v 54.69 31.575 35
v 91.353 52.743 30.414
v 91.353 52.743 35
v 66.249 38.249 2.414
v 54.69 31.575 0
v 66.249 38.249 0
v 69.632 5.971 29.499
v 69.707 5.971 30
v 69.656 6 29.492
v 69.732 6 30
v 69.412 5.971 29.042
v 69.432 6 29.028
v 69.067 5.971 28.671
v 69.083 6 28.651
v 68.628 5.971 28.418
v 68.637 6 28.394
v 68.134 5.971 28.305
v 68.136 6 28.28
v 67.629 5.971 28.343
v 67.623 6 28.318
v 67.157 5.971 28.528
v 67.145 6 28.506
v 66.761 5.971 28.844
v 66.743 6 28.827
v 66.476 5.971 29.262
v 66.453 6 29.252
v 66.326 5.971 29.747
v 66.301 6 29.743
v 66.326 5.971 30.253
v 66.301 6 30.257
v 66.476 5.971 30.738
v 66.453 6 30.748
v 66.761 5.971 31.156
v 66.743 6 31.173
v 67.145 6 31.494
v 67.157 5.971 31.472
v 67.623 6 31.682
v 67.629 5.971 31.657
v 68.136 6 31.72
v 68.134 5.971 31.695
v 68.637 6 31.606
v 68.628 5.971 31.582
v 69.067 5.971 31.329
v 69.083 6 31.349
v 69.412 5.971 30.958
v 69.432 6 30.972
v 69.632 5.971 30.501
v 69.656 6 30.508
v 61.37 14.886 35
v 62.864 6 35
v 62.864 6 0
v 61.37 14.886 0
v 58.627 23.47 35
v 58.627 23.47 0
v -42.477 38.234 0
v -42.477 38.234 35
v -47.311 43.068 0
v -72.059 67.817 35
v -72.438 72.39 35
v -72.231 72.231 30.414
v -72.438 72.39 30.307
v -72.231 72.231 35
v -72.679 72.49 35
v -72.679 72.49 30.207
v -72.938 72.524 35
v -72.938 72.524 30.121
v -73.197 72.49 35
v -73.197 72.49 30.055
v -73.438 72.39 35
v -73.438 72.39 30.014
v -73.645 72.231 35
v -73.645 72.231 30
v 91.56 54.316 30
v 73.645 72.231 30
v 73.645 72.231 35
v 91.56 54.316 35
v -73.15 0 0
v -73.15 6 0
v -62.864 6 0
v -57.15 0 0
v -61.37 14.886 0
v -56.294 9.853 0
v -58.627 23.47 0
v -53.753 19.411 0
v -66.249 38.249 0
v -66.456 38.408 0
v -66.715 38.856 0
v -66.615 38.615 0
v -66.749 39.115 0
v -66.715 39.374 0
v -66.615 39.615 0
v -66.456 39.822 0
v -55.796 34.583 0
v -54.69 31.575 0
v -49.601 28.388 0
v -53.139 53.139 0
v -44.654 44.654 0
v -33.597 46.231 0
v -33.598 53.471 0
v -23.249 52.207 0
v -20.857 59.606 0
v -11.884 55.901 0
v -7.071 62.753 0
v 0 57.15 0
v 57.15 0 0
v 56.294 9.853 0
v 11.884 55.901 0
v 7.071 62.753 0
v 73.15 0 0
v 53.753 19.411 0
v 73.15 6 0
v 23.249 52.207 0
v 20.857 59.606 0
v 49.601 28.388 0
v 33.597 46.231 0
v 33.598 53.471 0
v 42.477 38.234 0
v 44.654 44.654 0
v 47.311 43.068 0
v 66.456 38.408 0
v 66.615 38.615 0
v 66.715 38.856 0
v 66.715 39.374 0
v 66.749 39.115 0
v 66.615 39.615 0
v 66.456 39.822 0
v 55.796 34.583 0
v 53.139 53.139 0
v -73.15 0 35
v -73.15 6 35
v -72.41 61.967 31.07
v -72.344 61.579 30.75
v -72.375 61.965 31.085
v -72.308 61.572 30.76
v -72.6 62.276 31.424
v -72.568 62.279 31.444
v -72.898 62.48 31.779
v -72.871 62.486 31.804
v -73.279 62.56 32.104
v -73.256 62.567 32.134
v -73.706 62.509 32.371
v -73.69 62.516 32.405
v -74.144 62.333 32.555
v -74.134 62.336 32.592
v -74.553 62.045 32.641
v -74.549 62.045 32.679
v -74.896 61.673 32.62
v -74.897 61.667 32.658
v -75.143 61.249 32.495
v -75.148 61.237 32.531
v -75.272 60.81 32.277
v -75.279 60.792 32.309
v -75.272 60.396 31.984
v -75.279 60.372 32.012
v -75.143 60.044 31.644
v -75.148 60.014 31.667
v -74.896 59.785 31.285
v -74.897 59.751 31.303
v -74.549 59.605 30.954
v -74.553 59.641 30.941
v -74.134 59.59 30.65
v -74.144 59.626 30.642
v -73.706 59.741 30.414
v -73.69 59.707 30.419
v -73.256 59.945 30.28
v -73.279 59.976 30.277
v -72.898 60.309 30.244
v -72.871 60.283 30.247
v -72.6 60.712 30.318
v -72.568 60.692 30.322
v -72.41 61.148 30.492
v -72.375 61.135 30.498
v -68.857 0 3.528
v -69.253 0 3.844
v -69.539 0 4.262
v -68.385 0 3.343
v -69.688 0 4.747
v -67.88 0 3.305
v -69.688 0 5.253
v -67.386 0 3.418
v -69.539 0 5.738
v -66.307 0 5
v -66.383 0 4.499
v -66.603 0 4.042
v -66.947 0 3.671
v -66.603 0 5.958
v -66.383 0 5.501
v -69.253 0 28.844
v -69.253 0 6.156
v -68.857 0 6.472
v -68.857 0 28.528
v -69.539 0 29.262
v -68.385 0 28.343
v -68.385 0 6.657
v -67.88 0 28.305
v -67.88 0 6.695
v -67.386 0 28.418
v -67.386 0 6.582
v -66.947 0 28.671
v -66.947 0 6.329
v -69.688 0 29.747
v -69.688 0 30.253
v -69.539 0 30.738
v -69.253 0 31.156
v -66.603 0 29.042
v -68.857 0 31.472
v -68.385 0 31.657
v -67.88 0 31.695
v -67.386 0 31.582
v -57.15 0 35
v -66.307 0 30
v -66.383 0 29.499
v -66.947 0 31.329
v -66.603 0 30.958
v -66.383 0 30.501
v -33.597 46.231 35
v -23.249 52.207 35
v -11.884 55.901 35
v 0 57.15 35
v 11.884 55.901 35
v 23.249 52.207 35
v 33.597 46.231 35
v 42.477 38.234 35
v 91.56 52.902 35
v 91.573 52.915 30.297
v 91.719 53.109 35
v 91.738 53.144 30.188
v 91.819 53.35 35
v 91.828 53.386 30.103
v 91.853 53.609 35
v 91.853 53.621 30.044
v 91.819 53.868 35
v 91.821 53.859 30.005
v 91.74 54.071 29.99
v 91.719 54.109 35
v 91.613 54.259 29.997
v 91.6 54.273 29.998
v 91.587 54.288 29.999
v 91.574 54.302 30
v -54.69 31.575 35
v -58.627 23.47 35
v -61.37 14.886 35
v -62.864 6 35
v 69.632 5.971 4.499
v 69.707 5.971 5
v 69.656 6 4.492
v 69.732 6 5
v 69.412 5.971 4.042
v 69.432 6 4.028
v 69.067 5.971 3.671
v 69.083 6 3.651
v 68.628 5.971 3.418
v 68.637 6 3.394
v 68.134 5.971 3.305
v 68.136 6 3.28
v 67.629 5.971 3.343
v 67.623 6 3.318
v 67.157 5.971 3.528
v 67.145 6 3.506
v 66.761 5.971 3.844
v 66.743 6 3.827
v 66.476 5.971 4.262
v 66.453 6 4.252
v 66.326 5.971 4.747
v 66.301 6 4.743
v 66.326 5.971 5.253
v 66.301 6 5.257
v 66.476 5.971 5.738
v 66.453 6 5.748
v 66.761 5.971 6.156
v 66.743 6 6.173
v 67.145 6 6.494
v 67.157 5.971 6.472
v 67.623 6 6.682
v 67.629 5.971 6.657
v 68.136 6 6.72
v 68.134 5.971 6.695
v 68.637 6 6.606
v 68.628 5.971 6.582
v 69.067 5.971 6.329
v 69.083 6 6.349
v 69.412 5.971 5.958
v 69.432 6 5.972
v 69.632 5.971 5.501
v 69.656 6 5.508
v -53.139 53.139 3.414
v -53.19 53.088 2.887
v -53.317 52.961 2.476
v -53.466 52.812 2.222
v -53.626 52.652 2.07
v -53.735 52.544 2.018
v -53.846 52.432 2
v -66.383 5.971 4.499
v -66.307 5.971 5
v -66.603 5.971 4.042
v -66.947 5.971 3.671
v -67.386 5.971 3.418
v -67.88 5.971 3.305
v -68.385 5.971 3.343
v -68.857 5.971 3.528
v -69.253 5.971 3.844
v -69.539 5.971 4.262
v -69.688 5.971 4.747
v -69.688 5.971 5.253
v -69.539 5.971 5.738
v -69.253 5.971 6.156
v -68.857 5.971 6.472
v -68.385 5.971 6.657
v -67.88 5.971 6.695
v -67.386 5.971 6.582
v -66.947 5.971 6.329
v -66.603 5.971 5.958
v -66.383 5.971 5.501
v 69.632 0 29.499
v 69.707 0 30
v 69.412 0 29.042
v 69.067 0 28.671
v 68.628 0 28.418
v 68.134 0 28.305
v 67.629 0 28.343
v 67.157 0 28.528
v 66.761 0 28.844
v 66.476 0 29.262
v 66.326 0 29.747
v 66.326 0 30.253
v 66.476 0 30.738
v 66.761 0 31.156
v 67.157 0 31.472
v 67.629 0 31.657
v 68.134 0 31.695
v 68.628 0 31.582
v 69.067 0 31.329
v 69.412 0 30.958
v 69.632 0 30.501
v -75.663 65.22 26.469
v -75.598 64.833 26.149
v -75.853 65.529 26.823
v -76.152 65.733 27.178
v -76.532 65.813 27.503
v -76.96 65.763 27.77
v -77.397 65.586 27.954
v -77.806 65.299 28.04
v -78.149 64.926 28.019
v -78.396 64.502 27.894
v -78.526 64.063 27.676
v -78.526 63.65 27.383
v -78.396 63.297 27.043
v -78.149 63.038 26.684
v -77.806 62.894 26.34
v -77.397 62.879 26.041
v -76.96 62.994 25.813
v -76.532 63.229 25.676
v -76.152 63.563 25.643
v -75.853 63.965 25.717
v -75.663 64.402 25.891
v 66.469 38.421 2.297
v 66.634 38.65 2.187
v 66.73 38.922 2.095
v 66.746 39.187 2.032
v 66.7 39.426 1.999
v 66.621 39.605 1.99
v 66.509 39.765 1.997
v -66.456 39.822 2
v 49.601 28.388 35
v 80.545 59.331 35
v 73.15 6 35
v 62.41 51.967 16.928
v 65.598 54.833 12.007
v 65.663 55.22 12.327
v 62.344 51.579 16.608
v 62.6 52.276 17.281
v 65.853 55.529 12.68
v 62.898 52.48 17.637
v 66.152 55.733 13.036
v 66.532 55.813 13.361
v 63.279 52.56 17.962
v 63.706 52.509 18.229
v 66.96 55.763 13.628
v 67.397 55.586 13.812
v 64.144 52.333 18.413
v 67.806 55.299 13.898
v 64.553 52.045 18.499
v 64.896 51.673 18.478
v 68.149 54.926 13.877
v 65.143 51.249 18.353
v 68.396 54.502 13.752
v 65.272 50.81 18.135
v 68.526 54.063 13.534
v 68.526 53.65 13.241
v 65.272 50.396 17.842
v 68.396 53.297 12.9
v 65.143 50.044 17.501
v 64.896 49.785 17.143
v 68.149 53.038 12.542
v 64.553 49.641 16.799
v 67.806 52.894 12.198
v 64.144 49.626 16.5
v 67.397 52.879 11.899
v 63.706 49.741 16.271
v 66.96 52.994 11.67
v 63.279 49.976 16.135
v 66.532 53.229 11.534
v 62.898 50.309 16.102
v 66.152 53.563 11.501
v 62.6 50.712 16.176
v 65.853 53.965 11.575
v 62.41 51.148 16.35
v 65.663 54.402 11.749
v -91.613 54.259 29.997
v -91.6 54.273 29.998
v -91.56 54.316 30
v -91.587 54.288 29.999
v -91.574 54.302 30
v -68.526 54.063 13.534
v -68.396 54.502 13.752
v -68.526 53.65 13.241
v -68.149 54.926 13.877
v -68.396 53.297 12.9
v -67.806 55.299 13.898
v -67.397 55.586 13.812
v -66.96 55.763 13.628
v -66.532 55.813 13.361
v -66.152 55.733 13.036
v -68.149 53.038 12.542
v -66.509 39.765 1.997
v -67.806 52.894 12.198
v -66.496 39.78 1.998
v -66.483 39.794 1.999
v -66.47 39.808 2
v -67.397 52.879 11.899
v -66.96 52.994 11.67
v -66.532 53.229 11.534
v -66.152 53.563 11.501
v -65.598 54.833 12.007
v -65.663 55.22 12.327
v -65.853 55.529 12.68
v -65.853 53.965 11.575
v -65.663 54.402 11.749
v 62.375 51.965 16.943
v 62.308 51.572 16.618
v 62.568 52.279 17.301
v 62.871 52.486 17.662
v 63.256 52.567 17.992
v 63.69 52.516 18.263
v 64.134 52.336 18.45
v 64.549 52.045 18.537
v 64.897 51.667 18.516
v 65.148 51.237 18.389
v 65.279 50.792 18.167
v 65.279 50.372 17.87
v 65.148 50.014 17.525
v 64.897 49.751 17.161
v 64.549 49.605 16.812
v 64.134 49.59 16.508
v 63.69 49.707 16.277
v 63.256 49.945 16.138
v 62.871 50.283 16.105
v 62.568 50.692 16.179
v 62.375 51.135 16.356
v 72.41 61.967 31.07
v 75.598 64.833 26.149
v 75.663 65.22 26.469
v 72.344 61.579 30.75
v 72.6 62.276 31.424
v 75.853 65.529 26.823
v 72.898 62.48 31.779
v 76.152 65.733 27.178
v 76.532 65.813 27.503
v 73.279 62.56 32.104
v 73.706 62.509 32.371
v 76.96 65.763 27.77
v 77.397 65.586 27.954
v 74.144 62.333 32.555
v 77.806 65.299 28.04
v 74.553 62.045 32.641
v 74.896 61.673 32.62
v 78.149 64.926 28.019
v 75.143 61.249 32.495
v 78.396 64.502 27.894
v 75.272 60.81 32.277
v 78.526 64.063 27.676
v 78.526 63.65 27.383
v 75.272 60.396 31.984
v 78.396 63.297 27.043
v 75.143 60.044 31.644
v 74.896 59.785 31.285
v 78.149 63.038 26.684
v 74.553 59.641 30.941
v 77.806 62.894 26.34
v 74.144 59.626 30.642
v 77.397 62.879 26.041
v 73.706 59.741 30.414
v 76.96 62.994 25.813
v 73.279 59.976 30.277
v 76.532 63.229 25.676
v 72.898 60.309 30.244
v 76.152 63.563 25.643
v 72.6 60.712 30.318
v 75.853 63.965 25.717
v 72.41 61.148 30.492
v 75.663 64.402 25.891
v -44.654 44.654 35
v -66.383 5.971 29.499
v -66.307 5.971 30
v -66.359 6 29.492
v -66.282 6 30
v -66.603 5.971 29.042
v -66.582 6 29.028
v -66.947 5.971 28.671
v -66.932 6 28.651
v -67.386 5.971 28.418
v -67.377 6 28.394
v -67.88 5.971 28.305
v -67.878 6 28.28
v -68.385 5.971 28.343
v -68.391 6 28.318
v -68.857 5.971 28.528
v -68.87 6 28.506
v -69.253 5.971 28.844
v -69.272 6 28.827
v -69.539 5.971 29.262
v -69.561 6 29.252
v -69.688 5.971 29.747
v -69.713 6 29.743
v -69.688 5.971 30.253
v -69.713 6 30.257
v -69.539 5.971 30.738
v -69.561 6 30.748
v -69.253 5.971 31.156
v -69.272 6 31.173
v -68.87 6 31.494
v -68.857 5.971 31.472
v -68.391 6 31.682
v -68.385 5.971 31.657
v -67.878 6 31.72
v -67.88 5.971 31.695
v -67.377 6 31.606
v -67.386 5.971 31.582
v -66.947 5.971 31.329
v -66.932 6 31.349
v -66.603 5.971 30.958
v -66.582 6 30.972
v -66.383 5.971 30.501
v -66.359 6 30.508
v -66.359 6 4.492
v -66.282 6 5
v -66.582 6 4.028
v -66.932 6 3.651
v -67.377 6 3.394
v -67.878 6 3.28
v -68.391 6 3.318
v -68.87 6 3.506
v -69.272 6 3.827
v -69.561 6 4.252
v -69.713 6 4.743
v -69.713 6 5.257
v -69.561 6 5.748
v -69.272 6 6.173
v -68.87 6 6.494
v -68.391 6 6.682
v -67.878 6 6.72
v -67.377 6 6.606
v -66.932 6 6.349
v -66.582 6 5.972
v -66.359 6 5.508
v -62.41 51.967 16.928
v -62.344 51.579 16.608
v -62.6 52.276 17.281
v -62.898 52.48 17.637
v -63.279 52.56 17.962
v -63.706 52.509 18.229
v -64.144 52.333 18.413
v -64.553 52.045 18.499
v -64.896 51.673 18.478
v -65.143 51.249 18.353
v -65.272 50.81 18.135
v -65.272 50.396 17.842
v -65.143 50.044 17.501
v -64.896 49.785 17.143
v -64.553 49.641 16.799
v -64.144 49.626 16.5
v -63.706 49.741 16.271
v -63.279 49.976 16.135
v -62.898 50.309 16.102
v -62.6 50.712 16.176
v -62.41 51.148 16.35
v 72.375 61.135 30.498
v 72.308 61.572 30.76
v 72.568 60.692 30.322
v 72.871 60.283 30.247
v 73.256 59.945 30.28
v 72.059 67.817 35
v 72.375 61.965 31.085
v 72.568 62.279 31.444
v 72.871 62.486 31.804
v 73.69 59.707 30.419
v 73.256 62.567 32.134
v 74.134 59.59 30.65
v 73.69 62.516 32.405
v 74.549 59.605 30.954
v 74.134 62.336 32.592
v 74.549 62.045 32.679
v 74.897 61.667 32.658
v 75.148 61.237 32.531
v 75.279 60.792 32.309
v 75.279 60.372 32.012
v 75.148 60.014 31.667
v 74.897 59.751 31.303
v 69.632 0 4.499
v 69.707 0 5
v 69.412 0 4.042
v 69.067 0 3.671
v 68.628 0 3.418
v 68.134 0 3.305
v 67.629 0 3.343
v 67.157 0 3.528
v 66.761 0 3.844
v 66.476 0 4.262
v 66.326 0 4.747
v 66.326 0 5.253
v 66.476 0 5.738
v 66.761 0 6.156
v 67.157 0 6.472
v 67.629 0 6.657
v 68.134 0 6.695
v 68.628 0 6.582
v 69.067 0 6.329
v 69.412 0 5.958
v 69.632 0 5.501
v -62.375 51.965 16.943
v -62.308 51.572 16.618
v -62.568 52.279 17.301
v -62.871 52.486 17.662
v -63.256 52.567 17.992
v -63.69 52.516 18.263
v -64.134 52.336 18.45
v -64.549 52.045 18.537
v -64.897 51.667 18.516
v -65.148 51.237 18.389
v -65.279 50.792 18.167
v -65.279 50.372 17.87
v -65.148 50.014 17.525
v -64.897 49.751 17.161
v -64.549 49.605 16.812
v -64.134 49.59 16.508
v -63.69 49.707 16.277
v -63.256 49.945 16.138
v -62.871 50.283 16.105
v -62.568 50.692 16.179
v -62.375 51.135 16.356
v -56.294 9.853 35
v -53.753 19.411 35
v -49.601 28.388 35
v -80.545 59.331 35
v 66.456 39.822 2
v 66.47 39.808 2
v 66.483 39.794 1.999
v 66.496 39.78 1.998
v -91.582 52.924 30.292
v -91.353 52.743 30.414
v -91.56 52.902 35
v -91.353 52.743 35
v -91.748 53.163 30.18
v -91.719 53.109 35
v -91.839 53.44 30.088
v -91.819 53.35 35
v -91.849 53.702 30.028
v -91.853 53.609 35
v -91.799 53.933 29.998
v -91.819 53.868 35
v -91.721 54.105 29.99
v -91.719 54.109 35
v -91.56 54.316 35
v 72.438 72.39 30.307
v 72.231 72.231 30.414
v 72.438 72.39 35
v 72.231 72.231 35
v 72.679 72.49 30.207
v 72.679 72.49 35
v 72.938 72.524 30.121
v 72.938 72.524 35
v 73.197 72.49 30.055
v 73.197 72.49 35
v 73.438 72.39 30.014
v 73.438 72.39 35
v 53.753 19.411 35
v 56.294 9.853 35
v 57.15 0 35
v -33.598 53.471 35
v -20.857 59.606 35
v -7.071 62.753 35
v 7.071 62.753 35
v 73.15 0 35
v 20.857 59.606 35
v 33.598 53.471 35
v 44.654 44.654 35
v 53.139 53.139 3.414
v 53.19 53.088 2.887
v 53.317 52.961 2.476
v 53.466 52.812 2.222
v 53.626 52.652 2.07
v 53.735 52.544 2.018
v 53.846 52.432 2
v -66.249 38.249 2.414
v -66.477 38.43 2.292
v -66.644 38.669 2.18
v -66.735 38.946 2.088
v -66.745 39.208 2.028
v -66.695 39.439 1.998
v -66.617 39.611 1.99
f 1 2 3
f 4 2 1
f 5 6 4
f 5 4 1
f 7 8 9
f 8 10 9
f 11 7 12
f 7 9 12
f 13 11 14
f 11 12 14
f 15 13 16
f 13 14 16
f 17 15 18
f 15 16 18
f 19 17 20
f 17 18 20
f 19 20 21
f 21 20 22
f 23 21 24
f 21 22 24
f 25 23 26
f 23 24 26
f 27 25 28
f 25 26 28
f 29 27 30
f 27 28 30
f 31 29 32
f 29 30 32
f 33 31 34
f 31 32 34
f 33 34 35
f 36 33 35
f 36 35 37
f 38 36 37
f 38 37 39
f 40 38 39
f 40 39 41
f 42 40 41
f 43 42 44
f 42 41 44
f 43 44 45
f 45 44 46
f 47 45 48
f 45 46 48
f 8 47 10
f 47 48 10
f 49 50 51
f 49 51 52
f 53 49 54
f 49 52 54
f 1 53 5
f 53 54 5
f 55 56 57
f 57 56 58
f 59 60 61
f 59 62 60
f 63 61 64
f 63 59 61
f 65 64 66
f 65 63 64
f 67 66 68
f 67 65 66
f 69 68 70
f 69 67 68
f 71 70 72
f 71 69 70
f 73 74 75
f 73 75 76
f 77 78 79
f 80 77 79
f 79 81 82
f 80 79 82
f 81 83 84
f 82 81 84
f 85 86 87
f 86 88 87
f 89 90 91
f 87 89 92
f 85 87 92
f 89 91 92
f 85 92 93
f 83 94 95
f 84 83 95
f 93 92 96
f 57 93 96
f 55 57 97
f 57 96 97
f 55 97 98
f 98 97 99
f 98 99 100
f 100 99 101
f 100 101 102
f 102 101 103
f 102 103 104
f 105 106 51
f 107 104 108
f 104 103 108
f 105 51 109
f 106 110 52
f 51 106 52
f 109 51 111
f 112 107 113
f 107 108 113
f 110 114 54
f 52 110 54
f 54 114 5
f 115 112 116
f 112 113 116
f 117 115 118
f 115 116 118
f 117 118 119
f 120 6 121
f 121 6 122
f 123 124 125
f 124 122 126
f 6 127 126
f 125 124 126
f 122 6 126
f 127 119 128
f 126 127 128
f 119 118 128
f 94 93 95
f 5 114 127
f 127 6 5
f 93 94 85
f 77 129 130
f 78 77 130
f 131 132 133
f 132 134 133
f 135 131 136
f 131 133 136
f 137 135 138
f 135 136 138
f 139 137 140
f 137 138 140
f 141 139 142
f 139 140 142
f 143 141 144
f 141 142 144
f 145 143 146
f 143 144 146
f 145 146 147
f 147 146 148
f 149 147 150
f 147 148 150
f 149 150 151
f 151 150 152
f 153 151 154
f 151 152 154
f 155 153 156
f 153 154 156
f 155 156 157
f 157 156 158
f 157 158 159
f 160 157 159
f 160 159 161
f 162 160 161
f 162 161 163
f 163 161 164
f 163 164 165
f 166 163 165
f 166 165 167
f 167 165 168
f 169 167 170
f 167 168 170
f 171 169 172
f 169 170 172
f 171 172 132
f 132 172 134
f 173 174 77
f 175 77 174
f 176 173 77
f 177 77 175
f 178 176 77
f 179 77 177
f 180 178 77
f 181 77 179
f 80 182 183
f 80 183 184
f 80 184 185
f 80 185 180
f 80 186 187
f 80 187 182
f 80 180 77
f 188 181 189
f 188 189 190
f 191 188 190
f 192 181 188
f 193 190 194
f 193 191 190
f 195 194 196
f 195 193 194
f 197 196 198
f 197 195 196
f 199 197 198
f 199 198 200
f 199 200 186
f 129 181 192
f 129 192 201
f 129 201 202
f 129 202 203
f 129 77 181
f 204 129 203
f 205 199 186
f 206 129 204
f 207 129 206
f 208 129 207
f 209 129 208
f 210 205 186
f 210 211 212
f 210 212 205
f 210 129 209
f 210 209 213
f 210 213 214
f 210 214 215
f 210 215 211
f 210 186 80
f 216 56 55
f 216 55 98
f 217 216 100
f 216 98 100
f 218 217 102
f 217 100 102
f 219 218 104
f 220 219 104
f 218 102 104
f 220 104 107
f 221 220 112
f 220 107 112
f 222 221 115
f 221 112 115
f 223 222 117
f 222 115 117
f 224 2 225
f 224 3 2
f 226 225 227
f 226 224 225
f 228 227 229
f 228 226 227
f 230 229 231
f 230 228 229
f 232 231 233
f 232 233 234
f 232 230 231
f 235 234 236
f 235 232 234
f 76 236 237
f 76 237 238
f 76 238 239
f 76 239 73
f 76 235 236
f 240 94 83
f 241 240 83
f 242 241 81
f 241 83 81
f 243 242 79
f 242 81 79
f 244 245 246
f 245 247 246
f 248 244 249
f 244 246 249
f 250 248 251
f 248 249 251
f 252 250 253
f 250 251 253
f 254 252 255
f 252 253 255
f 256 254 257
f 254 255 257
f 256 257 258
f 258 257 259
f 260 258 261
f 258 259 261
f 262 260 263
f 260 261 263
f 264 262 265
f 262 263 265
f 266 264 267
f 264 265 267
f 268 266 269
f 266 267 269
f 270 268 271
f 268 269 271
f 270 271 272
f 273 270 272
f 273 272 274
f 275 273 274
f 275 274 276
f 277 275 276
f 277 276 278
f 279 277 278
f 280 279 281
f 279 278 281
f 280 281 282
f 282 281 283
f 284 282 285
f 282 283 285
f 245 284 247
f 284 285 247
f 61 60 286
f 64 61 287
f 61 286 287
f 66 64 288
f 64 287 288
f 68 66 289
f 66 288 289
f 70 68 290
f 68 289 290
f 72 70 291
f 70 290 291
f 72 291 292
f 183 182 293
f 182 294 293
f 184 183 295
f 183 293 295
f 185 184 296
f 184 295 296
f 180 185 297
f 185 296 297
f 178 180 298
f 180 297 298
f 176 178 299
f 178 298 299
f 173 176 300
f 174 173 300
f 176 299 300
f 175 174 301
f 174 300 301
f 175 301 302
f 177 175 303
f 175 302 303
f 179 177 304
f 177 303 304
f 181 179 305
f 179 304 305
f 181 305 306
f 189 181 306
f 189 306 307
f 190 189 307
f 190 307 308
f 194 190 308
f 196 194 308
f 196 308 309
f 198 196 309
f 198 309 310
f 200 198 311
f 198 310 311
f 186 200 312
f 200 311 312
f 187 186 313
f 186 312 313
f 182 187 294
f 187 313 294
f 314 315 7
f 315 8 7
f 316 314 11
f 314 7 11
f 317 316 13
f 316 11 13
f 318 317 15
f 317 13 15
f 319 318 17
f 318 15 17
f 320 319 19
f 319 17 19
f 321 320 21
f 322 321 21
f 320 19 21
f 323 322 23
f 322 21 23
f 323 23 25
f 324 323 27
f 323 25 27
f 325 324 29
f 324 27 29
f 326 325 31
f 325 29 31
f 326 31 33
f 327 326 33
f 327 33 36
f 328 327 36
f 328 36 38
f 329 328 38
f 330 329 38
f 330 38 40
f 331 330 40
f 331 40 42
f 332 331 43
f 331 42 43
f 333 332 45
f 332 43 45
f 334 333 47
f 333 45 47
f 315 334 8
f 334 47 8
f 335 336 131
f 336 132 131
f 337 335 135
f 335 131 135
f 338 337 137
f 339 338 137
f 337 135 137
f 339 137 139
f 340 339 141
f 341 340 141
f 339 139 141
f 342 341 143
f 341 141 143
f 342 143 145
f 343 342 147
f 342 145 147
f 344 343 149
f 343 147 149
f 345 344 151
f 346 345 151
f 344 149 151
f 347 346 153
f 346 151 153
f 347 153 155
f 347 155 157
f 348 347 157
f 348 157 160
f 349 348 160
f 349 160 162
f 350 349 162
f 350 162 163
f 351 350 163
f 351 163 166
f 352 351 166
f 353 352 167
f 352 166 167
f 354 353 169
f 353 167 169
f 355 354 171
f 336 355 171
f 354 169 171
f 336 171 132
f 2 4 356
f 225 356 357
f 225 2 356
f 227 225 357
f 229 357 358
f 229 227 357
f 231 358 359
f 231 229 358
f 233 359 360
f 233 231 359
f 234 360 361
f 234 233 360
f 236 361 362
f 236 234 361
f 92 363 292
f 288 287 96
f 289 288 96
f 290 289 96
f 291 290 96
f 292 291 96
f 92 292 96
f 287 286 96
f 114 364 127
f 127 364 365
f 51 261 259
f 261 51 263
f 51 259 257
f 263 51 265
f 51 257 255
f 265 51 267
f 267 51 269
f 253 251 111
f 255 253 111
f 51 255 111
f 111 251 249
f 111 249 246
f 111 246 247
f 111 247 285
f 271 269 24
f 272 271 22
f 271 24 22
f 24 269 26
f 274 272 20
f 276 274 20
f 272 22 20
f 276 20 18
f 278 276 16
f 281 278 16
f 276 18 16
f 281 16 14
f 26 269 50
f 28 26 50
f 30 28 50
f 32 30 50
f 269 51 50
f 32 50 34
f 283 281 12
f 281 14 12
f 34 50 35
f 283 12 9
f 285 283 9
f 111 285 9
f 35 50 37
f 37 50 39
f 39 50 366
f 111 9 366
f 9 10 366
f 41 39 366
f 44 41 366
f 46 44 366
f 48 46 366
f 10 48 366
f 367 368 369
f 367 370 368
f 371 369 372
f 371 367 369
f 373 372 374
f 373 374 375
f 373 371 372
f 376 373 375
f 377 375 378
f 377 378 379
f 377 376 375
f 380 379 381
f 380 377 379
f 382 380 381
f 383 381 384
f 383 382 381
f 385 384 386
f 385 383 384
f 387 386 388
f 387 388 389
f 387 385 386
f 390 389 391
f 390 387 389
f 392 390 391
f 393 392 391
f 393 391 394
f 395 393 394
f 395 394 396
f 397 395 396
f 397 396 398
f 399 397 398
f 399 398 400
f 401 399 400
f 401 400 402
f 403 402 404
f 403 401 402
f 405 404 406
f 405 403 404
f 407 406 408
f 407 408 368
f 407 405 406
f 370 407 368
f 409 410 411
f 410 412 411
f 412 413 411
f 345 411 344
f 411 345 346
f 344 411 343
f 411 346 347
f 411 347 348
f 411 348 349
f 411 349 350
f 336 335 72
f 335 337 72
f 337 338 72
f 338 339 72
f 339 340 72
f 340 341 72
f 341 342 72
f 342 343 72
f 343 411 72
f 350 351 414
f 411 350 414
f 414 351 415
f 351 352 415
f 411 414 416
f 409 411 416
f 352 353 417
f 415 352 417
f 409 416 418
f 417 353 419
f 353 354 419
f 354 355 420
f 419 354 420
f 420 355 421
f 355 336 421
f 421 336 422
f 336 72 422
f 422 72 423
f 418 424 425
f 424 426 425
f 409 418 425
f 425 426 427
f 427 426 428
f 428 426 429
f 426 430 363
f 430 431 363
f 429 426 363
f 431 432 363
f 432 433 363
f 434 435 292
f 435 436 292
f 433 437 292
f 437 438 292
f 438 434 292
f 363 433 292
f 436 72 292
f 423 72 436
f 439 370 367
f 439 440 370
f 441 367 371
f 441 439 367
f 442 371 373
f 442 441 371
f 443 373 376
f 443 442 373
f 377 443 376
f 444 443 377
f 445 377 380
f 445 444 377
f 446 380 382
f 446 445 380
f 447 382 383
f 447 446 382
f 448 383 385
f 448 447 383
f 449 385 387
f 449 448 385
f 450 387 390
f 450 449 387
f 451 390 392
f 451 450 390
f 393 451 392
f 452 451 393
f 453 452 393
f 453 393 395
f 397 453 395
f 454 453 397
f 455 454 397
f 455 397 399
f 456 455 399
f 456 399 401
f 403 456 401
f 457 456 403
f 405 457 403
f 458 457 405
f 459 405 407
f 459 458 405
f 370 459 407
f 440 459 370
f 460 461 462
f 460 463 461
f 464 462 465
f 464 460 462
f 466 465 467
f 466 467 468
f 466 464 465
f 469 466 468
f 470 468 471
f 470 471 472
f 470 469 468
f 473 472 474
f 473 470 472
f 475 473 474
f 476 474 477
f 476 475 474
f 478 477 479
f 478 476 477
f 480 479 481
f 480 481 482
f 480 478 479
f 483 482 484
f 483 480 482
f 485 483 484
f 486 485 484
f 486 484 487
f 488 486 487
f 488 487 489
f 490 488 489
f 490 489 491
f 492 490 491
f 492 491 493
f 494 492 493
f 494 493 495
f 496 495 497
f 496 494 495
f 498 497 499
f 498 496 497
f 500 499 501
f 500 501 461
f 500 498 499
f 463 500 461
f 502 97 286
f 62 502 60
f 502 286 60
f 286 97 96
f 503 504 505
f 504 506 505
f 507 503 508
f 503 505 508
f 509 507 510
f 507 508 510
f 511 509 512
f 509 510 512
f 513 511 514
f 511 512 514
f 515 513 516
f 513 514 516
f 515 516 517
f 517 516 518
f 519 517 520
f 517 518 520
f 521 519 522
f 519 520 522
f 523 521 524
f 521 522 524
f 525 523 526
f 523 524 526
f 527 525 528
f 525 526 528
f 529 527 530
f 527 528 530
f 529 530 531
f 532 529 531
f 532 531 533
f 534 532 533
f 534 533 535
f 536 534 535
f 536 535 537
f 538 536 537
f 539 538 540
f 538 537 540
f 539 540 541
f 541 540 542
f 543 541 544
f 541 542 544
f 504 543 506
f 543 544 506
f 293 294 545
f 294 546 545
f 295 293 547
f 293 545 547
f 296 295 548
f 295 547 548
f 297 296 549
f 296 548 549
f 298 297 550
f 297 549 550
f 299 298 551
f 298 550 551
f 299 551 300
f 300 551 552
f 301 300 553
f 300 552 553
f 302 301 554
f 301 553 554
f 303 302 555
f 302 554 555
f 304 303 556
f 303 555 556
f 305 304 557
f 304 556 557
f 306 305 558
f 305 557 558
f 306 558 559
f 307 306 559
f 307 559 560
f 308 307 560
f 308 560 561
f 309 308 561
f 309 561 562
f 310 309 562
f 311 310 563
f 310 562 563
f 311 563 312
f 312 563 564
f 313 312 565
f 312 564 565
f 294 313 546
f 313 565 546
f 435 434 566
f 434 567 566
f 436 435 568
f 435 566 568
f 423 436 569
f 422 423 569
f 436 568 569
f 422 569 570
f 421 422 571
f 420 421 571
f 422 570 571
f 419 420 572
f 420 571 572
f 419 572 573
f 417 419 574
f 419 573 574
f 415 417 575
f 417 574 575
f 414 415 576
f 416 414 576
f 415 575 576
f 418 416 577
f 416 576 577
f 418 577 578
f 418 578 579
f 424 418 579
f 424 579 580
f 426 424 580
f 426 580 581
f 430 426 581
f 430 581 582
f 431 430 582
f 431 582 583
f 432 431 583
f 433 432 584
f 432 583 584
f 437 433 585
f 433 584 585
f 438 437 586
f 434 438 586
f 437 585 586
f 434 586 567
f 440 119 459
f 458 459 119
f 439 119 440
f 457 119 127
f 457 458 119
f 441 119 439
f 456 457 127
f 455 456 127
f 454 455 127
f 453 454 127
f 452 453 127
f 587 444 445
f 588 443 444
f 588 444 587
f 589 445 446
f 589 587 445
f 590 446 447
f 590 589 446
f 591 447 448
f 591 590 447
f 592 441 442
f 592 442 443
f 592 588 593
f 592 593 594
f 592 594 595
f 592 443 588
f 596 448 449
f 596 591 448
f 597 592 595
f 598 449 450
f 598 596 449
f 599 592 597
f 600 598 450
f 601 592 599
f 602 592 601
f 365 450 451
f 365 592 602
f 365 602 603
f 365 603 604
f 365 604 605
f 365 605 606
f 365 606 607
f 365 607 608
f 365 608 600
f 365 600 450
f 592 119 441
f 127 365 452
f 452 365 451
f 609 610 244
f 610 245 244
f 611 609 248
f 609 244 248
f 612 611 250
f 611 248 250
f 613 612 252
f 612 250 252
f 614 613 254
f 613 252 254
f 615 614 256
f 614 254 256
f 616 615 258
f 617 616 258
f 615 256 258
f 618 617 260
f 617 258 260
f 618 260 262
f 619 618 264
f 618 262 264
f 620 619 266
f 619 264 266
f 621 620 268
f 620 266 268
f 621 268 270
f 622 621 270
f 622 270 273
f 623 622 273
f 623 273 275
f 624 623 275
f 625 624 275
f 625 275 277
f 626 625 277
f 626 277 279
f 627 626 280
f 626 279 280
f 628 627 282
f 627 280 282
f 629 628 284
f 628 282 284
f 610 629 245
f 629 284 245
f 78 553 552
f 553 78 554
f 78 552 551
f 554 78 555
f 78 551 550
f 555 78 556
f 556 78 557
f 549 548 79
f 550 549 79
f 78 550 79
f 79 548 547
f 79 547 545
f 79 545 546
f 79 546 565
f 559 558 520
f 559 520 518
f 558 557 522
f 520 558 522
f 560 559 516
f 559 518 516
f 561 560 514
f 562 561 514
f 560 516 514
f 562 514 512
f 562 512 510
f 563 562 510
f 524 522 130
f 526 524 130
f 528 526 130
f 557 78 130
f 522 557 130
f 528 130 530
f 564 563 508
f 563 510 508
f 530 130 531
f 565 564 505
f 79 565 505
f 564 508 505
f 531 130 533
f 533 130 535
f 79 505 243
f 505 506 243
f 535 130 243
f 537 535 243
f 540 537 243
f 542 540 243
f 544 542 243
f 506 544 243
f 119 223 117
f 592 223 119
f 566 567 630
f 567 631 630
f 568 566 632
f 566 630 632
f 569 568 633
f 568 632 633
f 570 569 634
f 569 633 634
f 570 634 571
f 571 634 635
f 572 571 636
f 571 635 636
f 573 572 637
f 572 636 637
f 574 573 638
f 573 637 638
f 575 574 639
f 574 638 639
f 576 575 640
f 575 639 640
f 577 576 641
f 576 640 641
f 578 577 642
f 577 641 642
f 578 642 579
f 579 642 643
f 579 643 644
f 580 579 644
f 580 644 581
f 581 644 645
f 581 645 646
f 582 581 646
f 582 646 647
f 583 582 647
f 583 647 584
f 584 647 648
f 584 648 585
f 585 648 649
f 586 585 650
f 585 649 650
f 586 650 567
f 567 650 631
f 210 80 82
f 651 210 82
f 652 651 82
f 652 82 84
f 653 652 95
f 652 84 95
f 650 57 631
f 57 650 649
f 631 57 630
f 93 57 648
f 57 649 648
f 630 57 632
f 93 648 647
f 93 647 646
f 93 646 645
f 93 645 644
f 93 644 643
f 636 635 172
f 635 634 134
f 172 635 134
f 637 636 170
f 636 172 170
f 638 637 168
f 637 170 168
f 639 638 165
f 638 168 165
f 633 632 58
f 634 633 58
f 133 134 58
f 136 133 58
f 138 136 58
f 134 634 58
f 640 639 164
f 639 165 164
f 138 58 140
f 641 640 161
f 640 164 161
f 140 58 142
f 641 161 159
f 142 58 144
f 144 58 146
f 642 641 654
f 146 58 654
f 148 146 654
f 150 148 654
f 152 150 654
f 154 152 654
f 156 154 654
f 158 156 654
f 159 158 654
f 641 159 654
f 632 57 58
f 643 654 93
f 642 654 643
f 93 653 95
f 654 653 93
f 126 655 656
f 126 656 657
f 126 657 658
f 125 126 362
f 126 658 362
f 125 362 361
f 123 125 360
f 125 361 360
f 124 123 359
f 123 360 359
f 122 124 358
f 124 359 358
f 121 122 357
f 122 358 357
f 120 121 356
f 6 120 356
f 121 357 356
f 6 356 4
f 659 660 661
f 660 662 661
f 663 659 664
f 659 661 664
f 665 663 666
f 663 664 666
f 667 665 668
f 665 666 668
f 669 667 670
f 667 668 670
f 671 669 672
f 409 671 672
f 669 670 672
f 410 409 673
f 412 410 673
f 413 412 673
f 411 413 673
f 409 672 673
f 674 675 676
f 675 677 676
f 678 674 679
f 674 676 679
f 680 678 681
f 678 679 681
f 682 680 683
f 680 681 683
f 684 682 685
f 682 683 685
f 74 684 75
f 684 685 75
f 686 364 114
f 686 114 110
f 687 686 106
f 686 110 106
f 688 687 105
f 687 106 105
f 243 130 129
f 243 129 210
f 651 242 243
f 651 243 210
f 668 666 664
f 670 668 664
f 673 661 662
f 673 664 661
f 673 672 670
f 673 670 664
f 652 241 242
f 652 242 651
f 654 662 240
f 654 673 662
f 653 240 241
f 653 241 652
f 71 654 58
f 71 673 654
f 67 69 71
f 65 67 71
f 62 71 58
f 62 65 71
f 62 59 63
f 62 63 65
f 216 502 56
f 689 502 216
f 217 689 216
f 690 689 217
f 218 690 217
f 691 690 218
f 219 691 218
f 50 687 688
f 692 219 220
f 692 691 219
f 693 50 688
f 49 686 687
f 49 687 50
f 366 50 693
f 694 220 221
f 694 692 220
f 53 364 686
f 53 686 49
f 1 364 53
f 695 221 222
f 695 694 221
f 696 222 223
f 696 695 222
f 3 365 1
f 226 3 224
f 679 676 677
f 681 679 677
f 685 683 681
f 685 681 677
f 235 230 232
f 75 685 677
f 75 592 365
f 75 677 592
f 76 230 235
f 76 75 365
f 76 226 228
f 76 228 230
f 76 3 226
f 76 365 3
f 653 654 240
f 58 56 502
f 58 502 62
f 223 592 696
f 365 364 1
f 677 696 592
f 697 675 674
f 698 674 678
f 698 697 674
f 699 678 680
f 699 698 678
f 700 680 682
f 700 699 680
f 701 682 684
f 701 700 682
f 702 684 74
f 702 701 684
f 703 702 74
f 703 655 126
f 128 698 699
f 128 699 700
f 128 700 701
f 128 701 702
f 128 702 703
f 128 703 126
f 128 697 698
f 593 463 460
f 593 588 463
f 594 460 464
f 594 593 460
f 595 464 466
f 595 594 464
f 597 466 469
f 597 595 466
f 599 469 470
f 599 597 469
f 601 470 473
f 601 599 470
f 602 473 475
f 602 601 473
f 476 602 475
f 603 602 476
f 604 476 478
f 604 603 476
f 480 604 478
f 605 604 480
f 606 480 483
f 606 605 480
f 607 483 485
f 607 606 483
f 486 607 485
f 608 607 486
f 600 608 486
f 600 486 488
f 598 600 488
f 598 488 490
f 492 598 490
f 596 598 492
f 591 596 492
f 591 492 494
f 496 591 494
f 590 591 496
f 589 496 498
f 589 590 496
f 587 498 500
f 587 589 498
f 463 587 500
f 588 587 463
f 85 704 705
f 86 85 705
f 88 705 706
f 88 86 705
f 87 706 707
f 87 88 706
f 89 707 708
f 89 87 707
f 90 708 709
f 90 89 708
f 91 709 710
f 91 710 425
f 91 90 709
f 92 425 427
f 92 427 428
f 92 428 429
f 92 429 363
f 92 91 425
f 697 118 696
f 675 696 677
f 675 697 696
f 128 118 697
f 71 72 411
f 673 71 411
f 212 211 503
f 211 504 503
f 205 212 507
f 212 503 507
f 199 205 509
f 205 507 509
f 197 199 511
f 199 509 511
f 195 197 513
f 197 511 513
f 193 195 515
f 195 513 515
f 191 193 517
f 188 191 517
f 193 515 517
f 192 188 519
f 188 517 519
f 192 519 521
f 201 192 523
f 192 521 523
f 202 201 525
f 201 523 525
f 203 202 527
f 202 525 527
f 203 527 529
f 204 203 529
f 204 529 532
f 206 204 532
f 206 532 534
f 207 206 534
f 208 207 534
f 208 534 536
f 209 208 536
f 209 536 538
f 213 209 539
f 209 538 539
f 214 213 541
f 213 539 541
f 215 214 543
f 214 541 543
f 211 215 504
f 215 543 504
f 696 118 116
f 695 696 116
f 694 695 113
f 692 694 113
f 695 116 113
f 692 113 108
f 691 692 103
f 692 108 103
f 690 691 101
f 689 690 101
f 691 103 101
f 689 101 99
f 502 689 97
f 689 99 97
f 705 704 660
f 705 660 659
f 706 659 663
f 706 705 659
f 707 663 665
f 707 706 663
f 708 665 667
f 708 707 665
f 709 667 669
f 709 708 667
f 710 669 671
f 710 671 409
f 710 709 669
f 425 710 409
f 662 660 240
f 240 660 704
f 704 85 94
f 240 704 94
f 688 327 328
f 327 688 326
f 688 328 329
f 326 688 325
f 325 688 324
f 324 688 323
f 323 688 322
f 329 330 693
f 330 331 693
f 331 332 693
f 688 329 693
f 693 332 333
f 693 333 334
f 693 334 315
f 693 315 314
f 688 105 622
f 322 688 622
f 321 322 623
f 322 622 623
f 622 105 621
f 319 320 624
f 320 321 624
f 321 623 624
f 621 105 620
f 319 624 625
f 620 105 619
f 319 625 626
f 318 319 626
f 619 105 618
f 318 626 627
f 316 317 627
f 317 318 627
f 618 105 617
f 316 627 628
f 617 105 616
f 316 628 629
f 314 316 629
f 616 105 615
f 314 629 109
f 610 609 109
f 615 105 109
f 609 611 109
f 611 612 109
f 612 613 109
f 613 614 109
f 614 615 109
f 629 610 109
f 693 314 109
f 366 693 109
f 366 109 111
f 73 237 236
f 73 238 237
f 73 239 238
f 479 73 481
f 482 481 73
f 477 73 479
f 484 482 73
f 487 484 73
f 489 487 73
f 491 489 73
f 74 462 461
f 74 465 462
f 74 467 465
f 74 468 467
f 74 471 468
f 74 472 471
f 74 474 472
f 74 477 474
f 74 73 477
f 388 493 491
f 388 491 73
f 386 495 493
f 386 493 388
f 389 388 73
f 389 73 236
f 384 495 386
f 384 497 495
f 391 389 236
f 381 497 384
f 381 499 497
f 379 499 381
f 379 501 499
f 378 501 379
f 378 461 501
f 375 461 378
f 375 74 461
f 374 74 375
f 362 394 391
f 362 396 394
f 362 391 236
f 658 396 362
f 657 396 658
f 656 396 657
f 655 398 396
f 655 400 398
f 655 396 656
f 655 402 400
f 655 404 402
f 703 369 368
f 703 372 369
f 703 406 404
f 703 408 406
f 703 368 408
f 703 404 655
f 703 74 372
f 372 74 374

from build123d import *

# Parameters (mm, degrees)
EXTRUDE_1_DEPTH     = 35
EXTRUDE_START       = -35
EXTRUDE_2_DEPTH     = 35
CUT_EXTRUDE_1_DEPTH = 123.873256546
SKETCH_4_W          = 12
SKETCH_4_H          = 35
CUT_EXTRUDE_4_DEPTH = 165.71136734
FILLET_1_R          = 1
FILLET_2_R          = 1
SKETCH_5_W          = 13
SKETCH_5_H          = 6
EXTRUDE_4_DEPTH     = 35


# Read off the part's stored shape, not the designer's step: M3 すきま穴1, M3 すきま穴2
with BuildPart() as part:
    # ｽｹｯﾁ1 → ﾎﾞｽ - 押し出し1 (new body)
    with BuildSketch(Plane.XY):
        with BuildLine():
            Line((57.15, 0), (63.15, 0))
            ThreePointArc((63.15, 0), (0, 63.15), (-63.15, 0))
            Line((-63.15, 0), (-57.15, 0))
            ThreePointArc((-57.15, 0), (0, 57.15), (57.15, 0))
        make_face()
    extrude(amount=EXTRUDE_1_DEPTH)

    # ｽｹｯﾁ2 → ﾎﾞｽ - 押し出し2 (add)
    with BuildSketch(Plane.XY.offset(35).offset(EXTRUDE_START)):
        with BuildLine():
            Line((-44.653793232, 44.653793232), (-72.938064479, 72.938064479))
            Line((-72.938064479, 72.938064479), (-92.481759954, 53.394369005))
            Line((-92.481759954, 53.394369005), (-54.689504249, 31.575))
            ThreePointArc((-54.689504249, 31.575), (-50.100263439, 38.443284242), (-44.653793232, 44.653793232))
        make_face()
    extrude_2 = extrude(amount=EXTRUDE_2_DEPTH)

    # ｽｹｯﾁ3 → ｶｯﾄ - 押し出し1 (cut, through all)
    with BuildSketch(Plane(origin=(0, 0, 0), x_dir=(0, 0, -1), z_dir=(0.7071067811865461, 0.7071067811865489, 0))):
        Polygon((-30, 103.15), (-2, 75.15), (0, 75.15), (0, 103.15), align=None)
    cut_extrude_1 = extrude(amount=-CUT_EXTRUDE_1_DEPTH, mode=Mode.SUBTRACT)

    # ﾐﾗｰ1: ﾎﾞｽ - 押し出し2, ｶｯﾄ - 押し出し1 across plane
    add(extrude_2.mirror(Plane(origin=(0, 0, 0), x_dir=(0, 0, 1), z_dir=(1, 0, 0))))
    add(cut_extrude_1.mirror(Plane(origin=(0, 0, 0), x_dir=(0, 0, 1), z_dir=(1, 0, 0))), mode=Mode.SUBTRACT)

    # ｽｹｯﾁ4 → ｶｯﾄ - 押し出し4 (cut, through all)
    with BuildSketch(Plane(origin=(-48.84340091, 48.84340091, 69.075), x_dir=(-0.707106781186546, -0.707106781186549, 0), z_dir=(0.5000000000000019, -0.4999999999999998, -0.7071067811865465))):
        with Locations((9, 27.689327138)):
            Rectangle(SKETCH_4_W, SKETCH_4_H)
    cut_extrude_4 = extrude(amount=CUT_EXTRUDE_4_DEPTH, mode=Mode.SUBTRACT)

    # ﾌｨﾚｯﾄ1
    fillet_1_edges = [part.edges().sort_by_distance(p)[0] for p in [
        (-72.938064479, 72.938064479, 32.5),
        (-92.481759954, 53.394369005, 32.5),
        (-67.377646733, 38.900502479, 1),
        (-79.929703344, 46.147435742, 16),
        (-63.038569543, 63.038569543, 16),
    ]]
    fillet(fillet_1_edges, radius=FILLET_1_R)

    # ﾐﾗｰ3: ｶｯﾄ - 押し出し4 across plane
    add(cut_extrude_4.mirror(Plane(origin=(0, 0, 0), x_dir=(0, 0, 1), z_dir=(1, 0, 0))), mode=Mode.SUBTRACT)

    # ﾌｨﾚｯﾄ2
    fillet_2_edges = [part.edges().sort_by_distance(p)[0] for p in [
        (72.938064479, 72.938064479, 32.5),
        (92.481759954, 53.394369005, 32.5),
        (63.038569543, 63.038569543, 16),
        (79.929703344, 46.147435742, 16),
        (67.377646733, 38.900502479, 1),
    ]]
    fillet(fillet_2_edges, radius=FILLET_2_R)

    # ｽｹｯﾁ5 → ﾎﾞｽ - 押し出し4 (add)
    with BuildSketch(Plane.XY.offset(35)):
        with Locations((-66.65, 3)):
            Rectangle(SKETCH_5_W, SKETCH_5_H)
        with Locations((66.65, 3)):
            Rectangle(SKETCH_5_W, SKETCH_5_H)
    extrude(amount=-EXTRUDE_4_DEPTH)

    # M3 すきま穴1 outline → M3 すきま穴1 (revolve, cut)
    with BuildSketch(Plane(origin=(68.007159089, 0, 30), x_dir=(1, 0, 0), z_dir=(0, 0, 1))):
        Polygon((0, 0), (1.7, 0), (1.7, 5.97124079), (1.725, 6), (0, 6), align=None)
    revolve(axis=Axis((68.007159089, 0, 30), (0, 1, 0)), mode=Mode.SUBTRACT)

    # Hole Wizard M3 _1 2 outline → Hole Wizard M3 _1 2 (revolve, cut)
    with BuildSketch(Plane(origin=(68.007159089, 0, 5), x_dir=(1, 0, 0), z_dir=(0, 0, 1))):
        Polygon((0, 0), (1.7, 0), (1.7, 5.97124079), (1.725, 6), (0, 6), align=None)
    revolve(axis=Axis((68.007159089, 0, 5), (0, 1, 0)), mode=Mode.SUBTRACT)

    # Hole Wizard M3 _1 3 outline → Hole Wizard M3 _1 3 (revolve, cut)
    with BuildSketch(Plane(origin=(-68.007159089, 0, 30), x_dir=(1, 0, 0), z_dir=(0, 0, 1))):
        Polygon((0, 0), (1.7, 0), (1.7, 5.97124079), (1.725, 6), (0, 6), align=None)
    revolve(axis=Axis((-68.007159089, 0, 30), (0, 1, 0)), mode=Mode.SUBTRACT)

    # Hole Wizard M3 _1 4 outline → Hole Wizard M3 _1 4 (revolve, cut)
    with BuildSketch(Plane(origin=(-68.007159089, 0, 5), x_dir=(1, 0, 0), z_dir=(0, 0, 1))):
        Polygon((0, 0), (1.7, 0), (1.7, 5.97124079), (1.725, 6), (0, 6), align=None)
    revolve(axis=Axis((-68.007159089, 0, 5), (0, 1, 0)), mode=Mode.SUBTRACT)

    # M3 すきま穴2 outline → M3 すきま穴2 (revolve, cut)
    with BuildSketch(Plane(origin=(-41.207361941, 28.47943988, 49.276010127), x_dir=(0.8660254037844382, 0.28867513459481287, -0.4082482904638642), z_dir=(0, -0.8164965809277269, -0.5773502691896247))):
        Polygon((0, -51.724861044), (1.7, -51.724861044), (1.7, -45.218086348), (1.725, -45.189327138), (0, -45.189327138), align=None)
    hole_wizard_m3_2 = revolve(axis=Axis((-41.207361941, 28.47943988, 49.276010127), (0.500000000000001, -0.49999999999999883, 0.7071067811865479)), mode=Mode.SUBTRACT)

    # Hole Wizard M3 _2 2 outline → Hole Wizard M3 _2 2 (revolve, cut)
    with BuildSketch(Plane(origin=(-51.207361941, 38.47943988, 63.418145751), x_dir=(0.8660254037844382, 0.28867513459481287, -0.4082482904638642), z_dir=(0, -0.8164965809277269, -0.5773502691896247))):
        Polygon((0, -51.724861044), (1.7, -51.724861044), (1.7, -45.218086348), (1.725, -45.189327138), (0, -45.189327138), align=None)
    hole_wizard_m3_2_2 = revolve(axis=Axis((-51.207361941, 38.47943988, 63.418145751), (0.500000000000001, -0.49999999999999883, 0.7071067811865479)), mode=Mode.SUBTRACT)

    # ﾐﾗｰ5: M3 すきま穴2, Hole Wizard M3 _2 2 across plane
    add(hole_wizard_m3_2.mirror(Plane(origin=(0, 0, 0), x_dir=(0, 0, 1), z_dir=(1, 0, 0))), mode=Mode.SUBTRACT)
    add(hole_wizard_m3_2_2.mirror(Plane(origin=(0, 0, 0), x_dir=(0, 0, 1), z_dir=(1, 0, 0))), mode=Mode.SUBTRACT)


solid = part.part
